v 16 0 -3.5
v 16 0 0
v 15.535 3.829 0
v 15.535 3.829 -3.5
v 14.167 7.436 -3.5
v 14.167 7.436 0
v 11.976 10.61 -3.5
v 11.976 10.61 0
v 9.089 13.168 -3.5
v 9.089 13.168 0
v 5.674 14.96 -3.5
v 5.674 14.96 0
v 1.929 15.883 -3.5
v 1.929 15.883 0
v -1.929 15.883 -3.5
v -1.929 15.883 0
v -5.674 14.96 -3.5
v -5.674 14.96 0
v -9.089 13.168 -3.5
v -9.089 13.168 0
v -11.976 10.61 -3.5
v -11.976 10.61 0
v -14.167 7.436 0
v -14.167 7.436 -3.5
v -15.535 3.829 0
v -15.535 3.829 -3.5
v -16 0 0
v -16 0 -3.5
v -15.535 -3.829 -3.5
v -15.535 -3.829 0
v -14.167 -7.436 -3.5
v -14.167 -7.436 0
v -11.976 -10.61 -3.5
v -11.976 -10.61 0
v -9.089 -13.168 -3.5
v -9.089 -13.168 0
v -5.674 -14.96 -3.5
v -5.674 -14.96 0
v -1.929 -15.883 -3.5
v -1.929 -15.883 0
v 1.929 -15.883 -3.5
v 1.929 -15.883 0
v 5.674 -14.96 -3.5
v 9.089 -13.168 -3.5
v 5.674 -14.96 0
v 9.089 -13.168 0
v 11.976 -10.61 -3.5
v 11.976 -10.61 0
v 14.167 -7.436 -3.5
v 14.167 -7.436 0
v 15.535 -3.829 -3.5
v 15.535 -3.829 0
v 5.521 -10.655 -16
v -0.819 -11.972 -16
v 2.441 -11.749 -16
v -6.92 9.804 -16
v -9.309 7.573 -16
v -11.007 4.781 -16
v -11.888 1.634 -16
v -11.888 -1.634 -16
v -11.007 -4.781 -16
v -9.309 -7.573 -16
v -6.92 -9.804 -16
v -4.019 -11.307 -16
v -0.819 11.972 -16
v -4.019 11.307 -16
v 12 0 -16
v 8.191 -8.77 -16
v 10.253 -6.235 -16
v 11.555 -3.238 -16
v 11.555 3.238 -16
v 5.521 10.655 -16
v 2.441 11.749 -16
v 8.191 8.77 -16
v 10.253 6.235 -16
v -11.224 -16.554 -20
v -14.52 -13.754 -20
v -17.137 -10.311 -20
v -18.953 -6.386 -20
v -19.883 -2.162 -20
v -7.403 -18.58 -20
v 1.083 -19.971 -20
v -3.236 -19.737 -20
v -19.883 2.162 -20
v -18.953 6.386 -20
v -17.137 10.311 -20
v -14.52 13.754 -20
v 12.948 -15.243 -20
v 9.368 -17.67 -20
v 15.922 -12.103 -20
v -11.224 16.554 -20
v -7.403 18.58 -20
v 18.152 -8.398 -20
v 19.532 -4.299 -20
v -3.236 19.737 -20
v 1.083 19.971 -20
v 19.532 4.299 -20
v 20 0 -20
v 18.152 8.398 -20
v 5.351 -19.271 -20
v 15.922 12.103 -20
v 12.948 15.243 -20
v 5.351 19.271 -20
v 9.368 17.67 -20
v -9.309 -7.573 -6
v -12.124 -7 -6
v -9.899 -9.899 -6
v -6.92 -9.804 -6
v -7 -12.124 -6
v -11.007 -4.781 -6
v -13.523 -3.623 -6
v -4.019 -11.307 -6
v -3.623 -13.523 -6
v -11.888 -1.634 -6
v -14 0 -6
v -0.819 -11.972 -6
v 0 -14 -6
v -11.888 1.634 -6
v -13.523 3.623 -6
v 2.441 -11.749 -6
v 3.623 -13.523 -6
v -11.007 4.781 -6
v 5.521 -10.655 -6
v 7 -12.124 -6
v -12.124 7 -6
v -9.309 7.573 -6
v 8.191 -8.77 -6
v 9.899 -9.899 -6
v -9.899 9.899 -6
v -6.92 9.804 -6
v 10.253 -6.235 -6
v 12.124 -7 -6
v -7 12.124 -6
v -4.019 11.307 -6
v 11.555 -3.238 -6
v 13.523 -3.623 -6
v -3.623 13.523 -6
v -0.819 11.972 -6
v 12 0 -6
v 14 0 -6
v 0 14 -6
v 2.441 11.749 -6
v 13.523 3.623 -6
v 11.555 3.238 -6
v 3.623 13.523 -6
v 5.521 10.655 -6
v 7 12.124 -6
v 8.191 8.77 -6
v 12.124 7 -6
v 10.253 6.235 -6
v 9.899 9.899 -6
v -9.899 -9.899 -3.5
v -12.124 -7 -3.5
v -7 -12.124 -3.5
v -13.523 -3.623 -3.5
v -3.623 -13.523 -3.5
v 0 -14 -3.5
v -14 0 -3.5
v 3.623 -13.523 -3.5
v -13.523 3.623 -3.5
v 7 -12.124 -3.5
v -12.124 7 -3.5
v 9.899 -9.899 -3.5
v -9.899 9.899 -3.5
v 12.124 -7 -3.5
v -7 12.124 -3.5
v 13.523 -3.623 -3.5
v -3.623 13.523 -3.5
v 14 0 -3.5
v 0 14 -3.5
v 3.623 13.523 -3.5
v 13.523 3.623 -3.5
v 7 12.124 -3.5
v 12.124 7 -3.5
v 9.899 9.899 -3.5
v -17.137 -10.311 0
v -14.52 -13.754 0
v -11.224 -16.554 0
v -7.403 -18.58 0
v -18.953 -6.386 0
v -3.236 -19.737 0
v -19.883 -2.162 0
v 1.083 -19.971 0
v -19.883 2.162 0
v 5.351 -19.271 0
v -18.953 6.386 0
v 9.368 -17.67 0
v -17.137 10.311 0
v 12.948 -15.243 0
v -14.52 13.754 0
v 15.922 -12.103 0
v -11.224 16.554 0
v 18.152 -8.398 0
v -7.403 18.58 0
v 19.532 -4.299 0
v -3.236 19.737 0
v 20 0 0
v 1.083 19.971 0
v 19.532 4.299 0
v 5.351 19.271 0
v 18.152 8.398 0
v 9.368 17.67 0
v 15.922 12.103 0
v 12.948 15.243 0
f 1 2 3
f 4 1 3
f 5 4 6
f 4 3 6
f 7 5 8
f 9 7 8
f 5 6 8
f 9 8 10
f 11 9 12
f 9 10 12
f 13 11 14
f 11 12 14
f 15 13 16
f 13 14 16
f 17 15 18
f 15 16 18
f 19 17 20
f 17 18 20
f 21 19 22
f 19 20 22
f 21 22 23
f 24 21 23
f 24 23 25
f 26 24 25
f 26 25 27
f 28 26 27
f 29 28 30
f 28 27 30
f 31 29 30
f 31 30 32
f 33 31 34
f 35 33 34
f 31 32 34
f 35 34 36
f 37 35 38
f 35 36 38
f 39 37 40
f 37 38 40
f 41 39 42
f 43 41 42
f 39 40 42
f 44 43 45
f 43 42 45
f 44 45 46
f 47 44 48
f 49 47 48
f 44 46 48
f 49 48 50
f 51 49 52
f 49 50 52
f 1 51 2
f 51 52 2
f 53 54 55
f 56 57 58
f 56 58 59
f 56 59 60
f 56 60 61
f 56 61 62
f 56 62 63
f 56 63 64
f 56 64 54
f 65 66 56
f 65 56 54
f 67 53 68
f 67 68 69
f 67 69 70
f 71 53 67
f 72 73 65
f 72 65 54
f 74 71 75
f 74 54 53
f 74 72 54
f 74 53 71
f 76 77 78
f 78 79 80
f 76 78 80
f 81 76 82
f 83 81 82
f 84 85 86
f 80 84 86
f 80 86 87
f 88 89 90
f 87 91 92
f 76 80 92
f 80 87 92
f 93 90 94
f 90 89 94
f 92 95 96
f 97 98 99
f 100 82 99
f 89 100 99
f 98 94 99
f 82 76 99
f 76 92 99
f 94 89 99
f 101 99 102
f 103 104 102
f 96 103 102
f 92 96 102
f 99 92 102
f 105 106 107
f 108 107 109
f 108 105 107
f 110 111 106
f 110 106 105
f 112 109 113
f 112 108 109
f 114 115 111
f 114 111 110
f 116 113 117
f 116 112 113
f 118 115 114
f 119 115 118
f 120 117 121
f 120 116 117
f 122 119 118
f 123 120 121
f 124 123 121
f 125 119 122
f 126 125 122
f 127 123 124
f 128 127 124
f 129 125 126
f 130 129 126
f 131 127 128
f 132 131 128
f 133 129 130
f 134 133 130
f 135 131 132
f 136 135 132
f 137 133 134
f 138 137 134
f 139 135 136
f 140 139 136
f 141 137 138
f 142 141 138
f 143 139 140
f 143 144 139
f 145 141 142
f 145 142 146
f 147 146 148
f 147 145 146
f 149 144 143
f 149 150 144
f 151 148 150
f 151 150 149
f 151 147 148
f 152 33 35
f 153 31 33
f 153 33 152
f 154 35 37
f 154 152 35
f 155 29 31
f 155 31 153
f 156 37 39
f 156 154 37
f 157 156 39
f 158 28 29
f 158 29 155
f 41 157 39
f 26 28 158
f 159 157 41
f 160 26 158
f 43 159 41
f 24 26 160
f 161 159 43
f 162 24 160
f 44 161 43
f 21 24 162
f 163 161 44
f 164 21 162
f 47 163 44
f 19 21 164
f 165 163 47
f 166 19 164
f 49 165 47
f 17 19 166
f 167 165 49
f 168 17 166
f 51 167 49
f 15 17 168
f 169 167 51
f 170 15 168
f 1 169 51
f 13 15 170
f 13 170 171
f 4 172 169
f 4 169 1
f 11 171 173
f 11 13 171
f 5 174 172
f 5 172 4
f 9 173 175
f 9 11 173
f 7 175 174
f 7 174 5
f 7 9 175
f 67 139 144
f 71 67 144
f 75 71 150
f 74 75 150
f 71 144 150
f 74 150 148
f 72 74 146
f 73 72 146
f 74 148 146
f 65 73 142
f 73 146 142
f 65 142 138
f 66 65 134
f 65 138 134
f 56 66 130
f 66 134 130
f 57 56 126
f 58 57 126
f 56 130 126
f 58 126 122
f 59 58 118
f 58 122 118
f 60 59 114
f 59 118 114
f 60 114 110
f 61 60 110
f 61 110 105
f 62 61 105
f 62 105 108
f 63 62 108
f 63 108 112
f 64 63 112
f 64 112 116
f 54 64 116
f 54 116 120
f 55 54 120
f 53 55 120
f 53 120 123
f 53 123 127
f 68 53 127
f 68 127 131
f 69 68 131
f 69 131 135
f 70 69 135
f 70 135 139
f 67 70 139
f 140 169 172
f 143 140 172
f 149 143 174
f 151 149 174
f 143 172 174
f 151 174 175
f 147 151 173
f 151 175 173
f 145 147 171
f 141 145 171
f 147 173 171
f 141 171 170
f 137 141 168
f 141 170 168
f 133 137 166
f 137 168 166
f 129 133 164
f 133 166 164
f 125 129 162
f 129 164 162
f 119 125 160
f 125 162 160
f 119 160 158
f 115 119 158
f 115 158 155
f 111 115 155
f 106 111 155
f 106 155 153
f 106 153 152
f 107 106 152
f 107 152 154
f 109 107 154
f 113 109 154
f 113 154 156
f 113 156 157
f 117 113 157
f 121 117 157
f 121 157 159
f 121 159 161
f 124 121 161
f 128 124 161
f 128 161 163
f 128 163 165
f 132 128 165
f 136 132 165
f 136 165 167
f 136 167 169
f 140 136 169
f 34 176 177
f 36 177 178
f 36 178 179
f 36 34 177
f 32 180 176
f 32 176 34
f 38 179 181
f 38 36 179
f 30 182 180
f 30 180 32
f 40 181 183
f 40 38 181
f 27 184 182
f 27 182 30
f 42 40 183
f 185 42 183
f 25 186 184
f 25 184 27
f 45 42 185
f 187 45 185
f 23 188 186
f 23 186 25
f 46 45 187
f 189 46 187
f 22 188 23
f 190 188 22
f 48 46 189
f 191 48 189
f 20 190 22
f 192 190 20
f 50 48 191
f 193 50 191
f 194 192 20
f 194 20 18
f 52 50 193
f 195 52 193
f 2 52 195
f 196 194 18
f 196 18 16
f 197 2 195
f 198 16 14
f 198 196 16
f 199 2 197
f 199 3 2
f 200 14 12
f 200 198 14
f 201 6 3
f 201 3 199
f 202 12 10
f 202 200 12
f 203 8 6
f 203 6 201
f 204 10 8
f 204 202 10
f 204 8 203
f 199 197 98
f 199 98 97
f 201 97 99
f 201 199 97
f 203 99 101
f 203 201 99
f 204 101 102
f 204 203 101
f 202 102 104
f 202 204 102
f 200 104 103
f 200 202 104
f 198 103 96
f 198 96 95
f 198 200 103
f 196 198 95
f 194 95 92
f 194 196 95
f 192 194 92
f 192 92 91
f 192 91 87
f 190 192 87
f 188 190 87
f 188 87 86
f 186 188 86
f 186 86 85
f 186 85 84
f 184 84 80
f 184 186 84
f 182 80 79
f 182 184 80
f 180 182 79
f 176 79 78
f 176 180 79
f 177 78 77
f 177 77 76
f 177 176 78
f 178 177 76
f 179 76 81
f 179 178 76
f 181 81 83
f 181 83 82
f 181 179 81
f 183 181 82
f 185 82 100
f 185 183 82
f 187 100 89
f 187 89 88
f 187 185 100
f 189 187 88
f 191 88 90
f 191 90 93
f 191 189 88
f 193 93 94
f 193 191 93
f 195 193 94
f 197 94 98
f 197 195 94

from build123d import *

# Parameters (mm, degrees)
F0_R     = 20
F0_R_2   = 16
F0_R_3   = 14
F0_R_4   = 12
F1_DEPTH = 20
F2_DEPTH = 16
F3_DEPTH = 6
F4_DEPTH = 3.5


with BuildPart() as f1:
    # F0 (on Top) → F1 (new body)
    with BuildSketch(Plane.XY):
        Circle(F0_R)
        Circle(F0_R_2, mode=Mode.SUBTRACT)
        Circle(F0_R_2)
        Circle(F0_R_3, mode=Mode.SUBTRACT)
        Circle(F0_R_3)
        Circle(F0_R_4, mode=Mode.SUBTRACT)
        Circle(F0_R_4)
    extrude(amount=-F1_DEPTH)

    # F0 (on Top) → F2 (cut)
    with BuildSketch(Plane.XY):
        Circle(F0_R_4)
    extrude(amount=-F2_DEPTH, mode=Mode.SUBTRACT)

    # F0 (on Top) → F3 (cut)
    with BuildSketch(Plane.XY):
        Circle(F0_R_3)
        Circle(F0_R_4, mode=Mode.SUBTRACT)
    extrude(amount=-F3_DEPTH, mode=Mode.SUBTRACT)

    # F0 (on Top) → F4 (cut)
    with BuildSketch(Plane.XY):
        Circle(F0_R_2)
        Circle(F0_R_3, mode=Mode.SUBTRACT)
    extrude(amount=-F4_DEPTH, mode=Mode.SUBTRACT)


solid = f1.part
